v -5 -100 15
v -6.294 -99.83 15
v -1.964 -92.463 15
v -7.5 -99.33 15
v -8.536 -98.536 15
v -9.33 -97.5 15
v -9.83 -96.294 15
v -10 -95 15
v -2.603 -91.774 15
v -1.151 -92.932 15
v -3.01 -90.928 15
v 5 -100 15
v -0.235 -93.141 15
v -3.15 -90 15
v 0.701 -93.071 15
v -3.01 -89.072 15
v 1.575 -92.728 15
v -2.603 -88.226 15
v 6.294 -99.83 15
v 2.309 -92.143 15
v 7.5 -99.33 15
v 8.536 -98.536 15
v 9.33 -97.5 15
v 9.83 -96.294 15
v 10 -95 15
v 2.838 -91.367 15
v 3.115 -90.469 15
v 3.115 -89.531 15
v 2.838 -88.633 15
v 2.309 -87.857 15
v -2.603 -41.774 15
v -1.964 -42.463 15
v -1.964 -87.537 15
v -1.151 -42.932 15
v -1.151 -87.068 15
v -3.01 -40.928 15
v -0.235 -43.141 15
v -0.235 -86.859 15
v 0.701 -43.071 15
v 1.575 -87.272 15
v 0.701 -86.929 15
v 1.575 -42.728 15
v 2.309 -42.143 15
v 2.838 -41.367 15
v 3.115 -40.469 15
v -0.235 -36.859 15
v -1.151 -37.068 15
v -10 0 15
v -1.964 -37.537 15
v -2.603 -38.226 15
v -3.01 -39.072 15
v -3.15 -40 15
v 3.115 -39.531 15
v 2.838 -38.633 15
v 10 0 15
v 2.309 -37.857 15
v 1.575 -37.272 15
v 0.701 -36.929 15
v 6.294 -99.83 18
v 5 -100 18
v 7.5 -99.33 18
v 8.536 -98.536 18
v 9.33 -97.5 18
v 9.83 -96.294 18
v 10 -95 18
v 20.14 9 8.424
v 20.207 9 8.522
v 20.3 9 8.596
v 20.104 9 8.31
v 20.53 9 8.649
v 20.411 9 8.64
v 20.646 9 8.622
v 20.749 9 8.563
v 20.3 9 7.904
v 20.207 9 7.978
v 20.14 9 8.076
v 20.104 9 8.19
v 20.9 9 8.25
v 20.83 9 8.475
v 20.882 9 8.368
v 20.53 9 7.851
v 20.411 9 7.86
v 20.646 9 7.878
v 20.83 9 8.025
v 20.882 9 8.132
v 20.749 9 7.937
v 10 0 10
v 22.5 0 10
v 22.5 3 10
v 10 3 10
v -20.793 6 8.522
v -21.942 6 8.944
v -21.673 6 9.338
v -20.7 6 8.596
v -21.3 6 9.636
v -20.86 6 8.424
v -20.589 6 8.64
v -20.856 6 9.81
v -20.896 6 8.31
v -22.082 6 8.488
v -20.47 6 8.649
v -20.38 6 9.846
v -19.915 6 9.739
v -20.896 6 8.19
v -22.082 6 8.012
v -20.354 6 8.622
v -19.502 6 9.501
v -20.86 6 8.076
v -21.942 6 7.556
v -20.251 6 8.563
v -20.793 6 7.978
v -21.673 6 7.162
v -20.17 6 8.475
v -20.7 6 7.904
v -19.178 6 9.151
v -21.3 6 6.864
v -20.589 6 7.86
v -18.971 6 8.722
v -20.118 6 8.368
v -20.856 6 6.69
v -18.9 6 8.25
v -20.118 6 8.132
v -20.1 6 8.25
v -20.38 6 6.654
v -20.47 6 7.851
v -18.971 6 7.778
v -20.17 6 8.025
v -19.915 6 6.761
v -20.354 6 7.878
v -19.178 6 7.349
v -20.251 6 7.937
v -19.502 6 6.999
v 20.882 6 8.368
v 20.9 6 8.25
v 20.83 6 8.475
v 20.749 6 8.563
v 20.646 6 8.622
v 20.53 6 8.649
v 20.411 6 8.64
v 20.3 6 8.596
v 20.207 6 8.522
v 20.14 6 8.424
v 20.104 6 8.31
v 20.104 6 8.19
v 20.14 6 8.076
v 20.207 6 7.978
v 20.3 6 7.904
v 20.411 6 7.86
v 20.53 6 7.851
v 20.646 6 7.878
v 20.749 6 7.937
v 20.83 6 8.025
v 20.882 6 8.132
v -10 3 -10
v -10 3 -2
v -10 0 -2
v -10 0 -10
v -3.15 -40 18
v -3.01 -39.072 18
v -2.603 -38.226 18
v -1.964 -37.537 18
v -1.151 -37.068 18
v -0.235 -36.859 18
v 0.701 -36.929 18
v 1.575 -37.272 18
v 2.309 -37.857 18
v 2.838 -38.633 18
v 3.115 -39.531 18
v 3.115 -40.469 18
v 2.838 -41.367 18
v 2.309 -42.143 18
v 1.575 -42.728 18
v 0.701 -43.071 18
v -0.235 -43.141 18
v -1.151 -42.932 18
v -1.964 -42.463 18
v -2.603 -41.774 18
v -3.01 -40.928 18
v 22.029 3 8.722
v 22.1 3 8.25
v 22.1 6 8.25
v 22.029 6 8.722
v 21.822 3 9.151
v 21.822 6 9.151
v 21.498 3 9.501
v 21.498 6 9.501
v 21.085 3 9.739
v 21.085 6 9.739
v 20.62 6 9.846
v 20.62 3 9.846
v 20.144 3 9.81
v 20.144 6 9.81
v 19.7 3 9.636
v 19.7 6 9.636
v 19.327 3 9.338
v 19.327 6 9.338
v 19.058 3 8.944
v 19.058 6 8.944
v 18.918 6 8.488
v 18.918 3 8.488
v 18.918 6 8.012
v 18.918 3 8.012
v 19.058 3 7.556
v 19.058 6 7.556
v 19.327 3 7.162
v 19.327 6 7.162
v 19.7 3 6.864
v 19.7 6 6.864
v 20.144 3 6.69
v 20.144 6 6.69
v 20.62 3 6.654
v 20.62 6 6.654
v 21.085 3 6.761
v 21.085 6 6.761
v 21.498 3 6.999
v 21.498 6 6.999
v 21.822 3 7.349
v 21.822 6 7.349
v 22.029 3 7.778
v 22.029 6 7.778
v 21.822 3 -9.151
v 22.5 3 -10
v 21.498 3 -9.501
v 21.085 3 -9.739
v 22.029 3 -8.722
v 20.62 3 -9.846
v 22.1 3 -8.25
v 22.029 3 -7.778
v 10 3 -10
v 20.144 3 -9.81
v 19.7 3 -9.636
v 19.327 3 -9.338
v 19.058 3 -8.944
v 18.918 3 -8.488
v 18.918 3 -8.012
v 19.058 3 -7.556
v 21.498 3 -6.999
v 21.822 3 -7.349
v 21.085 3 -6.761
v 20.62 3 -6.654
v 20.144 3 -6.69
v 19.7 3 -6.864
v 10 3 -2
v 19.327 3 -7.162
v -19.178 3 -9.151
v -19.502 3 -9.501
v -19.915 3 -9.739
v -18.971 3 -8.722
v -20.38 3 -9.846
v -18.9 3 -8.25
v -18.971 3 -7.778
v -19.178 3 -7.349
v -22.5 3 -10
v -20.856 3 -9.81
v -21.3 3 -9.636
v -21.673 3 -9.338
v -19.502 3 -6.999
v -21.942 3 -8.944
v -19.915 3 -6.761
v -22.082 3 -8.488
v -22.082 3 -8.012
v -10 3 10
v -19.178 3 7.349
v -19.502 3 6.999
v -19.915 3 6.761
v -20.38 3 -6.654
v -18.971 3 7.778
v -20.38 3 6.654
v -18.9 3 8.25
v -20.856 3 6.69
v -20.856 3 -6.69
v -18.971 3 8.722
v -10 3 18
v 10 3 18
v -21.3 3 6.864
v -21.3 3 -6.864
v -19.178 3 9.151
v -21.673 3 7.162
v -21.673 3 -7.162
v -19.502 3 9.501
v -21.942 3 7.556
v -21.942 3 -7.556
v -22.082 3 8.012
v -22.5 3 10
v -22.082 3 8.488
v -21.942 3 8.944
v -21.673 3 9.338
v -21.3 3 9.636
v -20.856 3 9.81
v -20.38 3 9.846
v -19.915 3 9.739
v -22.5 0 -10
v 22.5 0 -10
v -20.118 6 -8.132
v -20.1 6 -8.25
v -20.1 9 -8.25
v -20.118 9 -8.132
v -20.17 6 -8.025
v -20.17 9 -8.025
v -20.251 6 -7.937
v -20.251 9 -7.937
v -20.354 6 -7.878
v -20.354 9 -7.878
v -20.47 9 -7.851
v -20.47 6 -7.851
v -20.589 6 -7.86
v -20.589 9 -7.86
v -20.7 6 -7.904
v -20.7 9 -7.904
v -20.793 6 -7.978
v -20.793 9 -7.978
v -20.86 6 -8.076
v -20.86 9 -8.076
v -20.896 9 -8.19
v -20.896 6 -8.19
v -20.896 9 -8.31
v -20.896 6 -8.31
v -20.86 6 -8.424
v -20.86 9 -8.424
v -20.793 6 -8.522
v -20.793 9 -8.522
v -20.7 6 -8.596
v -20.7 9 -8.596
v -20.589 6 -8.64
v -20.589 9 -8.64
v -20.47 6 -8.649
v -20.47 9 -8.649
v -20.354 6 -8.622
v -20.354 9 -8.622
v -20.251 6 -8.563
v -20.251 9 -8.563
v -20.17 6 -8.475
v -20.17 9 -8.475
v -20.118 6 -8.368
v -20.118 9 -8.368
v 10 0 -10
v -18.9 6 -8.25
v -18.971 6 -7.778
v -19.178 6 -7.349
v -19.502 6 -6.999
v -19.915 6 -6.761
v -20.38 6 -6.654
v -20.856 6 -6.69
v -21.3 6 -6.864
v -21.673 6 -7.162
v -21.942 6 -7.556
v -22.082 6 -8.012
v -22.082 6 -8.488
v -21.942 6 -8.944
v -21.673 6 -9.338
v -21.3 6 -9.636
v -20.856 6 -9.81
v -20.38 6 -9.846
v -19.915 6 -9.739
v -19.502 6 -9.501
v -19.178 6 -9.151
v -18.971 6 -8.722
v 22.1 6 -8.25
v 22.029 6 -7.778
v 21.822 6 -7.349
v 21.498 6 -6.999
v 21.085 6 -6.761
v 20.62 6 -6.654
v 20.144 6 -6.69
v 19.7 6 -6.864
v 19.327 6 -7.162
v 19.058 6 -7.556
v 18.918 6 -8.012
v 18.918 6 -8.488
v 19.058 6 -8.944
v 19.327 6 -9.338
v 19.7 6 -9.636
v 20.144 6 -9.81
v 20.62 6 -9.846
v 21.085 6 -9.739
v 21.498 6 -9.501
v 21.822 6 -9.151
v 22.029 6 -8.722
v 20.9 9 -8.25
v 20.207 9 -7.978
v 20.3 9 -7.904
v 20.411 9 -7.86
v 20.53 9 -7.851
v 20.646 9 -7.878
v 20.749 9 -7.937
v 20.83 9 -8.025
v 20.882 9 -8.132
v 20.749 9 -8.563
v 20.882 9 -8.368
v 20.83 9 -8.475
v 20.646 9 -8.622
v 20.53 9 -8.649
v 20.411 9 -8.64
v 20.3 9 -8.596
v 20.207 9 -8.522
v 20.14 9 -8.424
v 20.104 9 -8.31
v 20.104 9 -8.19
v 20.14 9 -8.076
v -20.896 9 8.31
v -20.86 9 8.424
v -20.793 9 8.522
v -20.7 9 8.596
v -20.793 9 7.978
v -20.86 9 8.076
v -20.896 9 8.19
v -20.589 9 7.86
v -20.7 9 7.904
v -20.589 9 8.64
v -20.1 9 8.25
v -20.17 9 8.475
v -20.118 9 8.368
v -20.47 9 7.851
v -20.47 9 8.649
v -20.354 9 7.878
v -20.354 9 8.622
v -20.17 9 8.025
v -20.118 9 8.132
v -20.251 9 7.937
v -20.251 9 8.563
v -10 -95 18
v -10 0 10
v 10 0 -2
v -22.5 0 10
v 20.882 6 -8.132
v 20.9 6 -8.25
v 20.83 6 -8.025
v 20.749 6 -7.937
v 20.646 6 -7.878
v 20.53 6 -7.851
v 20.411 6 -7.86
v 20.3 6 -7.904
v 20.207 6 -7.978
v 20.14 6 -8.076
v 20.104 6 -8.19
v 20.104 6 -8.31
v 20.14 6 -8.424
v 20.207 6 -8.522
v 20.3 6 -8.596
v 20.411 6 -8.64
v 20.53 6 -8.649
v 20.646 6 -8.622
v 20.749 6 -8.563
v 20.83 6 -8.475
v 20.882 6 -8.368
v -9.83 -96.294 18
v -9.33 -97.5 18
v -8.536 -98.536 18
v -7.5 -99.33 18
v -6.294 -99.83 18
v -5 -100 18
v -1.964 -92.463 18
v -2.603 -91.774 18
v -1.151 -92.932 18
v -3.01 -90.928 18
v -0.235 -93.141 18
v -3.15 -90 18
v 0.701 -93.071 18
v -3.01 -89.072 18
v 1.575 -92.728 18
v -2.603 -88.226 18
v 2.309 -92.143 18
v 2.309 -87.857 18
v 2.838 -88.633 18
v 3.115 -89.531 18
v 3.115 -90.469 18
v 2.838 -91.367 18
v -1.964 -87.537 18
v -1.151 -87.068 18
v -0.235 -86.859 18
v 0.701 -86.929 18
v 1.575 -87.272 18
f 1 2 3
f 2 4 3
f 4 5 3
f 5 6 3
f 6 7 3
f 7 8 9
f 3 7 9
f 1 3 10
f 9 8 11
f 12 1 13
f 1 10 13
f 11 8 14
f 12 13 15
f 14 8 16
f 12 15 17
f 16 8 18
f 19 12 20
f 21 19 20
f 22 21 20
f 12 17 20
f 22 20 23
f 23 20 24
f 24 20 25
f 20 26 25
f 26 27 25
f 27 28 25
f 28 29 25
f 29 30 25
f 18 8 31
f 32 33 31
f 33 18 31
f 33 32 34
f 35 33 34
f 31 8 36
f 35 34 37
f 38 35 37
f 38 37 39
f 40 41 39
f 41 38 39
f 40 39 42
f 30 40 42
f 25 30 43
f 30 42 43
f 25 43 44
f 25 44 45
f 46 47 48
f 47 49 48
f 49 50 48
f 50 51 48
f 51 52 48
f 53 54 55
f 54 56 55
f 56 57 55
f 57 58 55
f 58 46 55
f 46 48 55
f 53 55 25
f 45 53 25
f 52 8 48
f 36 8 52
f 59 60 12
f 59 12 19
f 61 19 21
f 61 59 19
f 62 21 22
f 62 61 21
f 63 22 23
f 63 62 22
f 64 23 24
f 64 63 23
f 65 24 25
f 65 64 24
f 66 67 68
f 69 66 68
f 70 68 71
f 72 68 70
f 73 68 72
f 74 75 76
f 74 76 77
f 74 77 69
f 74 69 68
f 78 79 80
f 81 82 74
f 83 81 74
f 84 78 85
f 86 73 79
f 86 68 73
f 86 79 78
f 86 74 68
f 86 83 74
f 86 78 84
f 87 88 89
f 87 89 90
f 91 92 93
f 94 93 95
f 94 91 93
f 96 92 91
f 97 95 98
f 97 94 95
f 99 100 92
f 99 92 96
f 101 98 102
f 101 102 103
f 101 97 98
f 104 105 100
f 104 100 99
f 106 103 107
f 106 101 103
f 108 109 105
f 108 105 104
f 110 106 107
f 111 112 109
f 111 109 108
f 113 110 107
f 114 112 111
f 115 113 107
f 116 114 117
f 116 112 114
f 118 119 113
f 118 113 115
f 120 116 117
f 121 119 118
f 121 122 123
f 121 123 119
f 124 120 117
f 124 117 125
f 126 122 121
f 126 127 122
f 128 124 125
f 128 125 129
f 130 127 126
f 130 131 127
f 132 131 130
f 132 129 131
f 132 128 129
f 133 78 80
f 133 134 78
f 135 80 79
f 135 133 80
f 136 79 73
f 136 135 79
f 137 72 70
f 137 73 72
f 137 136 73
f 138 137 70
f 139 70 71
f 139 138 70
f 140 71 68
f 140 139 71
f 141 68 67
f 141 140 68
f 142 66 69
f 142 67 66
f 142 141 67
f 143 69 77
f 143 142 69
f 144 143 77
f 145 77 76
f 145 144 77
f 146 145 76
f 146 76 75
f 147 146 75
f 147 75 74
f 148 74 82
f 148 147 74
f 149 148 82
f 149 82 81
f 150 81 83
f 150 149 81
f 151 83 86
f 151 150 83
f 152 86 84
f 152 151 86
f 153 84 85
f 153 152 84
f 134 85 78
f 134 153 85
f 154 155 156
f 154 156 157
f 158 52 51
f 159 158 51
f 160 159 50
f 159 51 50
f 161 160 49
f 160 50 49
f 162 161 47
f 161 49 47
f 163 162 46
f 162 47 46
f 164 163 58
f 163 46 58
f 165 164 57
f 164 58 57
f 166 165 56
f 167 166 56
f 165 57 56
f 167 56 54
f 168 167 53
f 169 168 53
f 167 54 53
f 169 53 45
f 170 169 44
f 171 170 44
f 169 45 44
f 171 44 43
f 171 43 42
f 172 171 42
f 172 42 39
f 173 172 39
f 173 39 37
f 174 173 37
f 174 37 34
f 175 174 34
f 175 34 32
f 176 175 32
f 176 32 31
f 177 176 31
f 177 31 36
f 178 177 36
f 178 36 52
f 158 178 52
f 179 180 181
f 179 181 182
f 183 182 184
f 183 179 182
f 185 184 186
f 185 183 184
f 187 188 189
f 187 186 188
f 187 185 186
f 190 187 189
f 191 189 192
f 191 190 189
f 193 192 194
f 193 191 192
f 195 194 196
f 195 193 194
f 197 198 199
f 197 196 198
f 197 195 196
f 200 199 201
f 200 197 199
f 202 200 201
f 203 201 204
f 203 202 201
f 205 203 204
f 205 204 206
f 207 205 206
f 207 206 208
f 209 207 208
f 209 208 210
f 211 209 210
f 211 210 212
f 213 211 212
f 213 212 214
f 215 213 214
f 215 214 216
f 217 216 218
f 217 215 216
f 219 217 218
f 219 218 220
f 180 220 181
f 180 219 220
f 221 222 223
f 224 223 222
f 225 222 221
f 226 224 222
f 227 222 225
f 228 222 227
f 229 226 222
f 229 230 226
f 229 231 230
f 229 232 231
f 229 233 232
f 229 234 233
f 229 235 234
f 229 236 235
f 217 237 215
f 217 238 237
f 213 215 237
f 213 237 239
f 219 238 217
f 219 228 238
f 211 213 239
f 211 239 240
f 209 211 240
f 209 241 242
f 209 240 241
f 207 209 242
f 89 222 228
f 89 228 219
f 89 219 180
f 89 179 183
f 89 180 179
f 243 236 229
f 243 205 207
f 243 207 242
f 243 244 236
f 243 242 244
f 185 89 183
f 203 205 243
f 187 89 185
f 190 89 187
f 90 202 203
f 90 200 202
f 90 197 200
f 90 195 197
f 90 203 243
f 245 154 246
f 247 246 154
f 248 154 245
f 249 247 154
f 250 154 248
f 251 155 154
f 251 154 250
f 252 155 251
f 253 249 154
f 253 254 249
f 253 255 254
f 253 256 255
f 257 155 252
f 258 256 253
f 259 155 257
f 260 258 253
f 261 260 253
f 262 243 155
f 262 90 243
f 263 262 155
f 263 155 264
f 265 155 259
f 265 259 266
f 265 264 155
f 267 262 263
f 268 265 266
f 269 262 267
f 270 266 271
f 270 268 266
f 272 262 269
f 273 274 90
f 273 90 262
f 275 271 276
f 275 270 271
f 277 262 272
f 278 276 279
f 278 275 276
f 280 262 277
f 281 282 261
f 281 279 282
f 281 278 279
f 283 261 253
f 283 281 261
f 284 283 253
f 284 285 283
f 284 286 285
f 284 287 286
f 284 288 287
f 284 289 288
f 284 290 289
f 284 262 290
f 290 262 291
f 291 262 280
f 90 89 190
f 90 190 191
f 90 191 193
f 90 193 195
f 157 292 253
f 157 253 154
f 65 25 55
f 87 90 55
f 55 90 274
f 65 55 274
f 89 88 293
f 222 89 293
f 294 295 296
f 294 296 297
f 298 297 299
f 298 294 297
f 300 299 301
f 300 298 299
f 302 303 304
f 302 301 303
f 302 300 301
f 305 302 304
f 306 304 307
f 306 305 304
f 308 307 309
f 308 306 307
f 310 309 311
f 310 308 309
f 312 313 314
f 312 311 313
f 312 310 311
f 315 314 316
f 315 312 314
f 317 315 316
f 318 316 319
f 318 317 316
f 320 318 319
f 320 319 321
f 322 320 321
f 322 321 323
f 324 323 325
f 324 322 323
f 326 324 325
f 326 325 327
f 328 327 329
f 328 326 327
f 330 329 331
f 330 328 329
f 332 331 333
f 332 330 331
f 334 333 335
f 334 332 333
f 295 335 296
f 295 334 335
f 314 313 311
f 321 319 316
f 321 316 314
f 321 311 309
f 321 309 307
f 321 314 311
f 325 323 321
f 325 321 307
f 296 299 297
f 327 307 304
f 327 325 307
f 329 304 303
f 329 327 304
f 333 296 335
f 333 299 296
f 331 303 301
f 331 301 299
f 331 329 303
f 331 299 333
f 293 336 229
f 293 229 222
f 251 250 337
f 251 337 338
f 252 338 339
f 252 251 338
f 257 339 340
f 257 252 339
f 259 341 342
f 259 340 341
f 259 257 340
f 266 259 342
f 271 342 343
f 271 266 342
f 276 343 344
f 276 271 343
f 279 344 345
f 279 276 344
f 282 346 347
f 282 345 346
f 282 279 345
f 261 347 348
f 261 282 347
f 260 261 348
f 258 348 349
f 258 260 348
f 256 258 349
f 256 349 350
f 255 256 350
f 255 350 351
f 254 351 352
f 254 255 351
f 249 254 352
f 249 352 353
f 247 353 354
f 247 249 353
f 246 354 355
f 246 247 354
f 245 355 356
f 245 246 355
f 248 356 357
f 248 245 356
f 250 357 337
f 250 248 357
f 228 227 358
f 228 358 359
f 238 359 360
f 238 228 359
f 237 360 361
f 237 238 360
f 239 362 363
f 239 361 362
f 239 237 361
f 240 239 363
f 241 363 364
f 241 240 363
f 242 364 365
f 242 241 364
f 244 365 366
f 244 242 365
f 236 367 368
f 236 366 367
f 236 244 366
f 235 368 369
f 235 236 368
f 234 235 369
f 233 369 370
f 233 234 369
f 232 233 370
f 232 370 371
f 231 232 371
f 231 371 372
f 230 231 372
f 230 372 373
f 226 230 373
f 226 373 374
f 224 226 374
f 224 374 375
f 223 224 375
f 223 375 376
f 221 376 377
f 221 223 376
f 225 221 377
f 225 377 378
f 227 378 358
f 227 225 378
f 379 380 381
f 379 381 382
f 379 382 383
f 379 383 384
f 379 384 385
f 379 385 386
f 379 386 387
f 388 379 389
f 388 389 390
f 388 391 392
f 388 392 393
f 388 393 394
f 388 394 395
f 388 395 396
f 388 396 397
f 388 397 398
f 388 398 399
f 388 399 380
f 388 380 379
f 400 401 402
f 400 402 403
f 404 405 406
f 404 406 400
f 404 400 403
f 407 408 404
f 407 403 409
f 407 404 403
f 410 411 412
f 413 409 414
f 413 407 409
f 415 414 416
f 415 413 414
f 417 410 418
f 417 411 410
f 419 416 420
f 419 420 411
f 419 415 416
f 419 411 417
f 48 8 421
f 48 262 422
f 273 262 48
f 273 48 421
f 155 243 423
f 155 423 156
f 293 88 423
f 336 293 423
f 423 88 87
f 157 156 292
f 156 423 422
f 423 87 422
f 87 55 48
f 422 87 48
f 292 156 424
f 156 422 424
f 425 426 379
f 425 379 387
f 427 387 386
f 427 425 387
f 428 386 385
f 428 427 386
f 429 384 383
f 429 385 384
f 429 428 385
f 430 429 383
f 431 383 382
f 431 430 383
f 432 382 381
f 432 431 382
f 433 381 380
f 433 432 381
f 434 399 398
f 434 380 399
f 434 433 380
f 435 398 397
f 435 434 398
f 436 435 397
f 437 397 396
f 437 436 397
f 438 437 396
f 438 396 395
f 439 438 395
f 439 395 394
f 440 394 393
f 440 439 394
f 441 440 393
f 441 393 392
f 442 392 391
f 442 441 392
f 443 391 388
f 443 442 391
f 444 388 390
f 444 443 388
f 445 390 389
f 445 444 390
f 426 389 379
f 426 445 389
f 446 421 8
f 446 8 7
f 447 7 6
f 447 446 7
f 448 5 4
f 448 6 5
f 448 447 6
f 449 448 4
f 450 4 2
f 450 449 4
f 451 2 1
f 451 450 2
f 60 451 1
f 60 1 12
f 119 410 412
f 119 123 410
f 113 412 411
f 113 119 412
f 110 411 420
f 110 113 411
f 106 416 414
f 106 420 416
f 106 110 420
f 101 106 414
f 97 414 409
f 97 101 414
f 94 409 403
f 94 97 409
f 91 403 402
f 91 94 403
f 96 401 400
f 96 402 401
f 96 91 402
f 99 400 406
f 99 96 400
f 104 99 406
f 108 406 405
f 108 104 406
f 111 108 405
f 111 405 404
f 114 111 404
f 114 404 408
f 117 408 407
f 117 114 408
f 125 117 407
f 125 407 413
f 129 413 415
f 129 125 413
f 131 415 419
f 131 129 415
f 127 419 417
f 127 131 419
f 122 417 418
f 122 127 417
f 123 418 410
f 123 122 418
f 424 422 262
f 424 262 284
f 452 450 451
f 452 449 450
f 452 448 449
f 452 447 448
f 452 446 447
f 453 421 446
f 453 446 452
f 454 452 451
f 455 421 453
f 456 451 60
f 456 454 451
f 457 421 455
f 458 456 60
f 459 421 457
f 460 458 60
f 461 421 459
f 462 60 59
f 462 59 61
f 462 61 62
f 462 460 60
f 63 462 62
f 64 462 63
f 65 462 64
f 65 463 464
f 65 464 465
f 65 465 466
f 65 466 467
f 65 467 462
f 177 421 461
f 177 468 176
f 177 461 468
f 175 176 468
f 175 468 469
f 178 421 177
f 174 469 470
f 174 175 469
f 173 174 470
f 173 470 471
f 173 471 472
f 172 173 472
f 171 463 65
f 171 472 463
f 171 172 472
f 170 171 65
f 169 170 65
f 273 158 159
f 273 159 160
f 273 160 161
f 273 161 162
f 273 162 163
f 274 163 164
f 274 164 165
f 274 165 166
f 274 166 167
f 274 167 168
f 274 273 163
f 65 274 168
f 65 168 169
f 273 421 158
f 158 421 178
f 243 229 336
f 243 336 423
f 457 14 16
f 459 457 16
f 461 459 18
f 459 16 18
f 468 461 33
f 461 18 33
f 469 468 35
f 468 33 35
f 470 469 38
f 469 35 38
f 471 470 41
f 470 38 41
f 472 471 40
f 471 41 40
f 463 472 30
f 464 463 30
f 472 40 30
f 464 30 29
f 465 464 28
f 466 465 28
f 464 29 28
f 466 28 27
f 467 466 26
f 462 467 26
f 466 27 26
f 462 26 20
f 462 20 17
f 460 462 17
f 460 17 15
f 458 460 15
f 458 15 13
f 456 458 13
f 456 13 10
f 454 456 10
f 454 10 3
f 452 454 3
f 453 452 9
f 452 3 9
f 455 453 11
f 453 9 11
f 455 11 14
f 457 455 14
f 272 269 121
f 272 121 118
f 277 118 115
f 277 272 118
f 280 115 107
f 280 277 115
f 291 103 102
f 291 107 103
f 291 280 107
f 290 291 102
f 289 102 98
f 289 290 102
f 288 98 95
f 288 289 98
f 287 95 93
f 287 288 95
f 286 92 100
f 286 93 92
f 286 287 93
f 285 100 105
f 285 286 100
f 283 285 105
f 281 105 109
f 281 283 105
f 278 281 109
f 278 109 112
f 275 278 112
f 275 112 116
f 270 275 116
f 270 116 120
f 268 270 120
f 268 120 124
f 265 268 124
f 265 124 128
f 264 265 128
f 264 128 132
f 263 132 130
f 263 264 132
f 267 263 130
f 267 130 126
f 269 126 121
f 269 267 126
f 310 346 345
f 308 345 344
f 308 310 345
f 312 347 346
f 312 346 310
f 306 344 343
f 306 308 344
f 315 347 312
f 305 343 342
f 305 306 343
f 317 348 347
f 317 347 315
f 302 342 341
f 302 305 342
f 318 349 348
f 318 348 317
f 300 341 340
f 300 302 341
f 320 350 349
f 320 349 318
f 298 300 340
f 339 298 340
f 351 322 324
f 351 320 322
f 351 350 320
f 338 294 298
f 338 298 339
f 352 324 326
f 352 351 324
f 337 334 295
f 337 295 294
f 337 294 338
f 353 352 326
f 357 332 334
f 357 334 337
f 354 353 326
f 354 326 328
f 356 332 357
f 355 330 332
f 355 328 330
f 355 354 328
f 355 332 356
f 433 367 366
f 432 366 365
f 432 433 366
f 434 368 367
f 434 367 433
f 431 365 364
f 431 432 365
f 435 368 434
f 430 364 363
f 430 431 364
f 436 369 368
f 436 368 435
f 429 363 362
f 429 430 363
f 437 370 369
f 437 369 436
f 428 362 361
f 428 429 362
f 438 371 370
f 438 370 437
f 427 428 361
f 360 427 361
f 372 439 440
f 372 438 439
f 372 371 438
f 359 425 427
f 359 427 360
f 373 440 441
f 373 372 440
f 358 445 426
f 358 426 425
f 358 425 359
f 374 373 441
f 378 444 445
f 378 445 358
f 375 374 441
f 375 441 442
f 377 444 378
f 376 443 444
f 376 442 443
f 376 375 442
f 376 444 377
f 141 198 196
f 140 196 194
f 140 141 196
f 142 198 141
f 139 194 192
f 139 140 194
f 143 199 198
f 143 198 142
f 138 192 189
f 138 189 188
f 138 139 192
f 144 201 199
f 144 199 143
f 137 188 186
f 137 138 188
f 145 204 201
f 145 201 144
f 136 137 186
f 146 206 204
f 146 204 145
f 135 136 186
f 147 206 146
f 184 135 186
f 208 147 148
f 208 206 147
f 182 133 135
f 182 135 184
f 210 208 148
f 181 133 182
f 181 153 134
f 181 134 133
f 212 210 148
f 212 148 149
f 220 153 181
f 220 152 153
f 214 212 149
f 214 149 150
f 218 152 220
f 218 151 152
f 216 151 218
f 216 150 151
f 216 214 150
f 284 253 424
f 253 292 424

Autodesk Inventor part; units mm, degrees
ref_plane "YZ Plane" through (0, 0, 0) normal (1, 0, 0) x (0, 1, 0)
ref_plane "XZ Plane" through (0, 0, 0) normal (0, 1, 0) x (-1, 0, 0)
ref_plane "XY Plane" through (0, 0, 0) normal (0, 0, 1) x (1, 0, 0)
sketch "스케치1" plane through (0, 0, 0) normal (0, 1, 0) x (-1, 0, 0)
  line L0 (20.5, 10) -> (-20.5, 10)
  line L1 (-22.5, 8) -> (-22.5, -8)
  line L2 (-20.5, -10) -> (20.5, -10)
  line L3 (22.5, -8) -> (22.5, 8)
  line L4 (22.5, 10) -> (-22.5, -10) construction
  line L5 (-22.5, 10) -> (22.5, -10) construction
  line L6 (20.5, 8.25) -> (-20.5, 8.25)
  line L7 (-20.5, 8.25) -> (-20.5, -8.25)
  line L8 (-20.5, -8.25) -> (20.5, -8.25)
  line L9 (20.5, -8.25) -> (20.5, 8.25)
  line L10 (20.5, 8.25) -> (-20.5, -8.25) construction
  line L11 (-20.5, 8.25) -> (20.5, -8.25) construction
  circle A0 centre (20.5, -8.25) radius 1.1
  circle A1 centre (-20.5, -8.25) radius 1.1
  circle A2 centre (-20.5, 8.25) radius 1.1
  circle A3 centre (20.5, 8.25) radius 1.1
  arc A4 (20.5, -10) -> (22.5, -8) centre (20.5, -8) ccw
  arc A5 (22.5, 8) -> (20.5, 10) centre (20.5, 8) ccw
  arc A6 (-20.5, 10) -> (-22.5, 8) centre (-20.5, 8) ccw
  arc A7 (-22.5, -8) -> (-20.5, -10) centre (-20.5, -8) ccw
  line L12 (-22.5, 10) -> (22.5, 10)
  line L13 (22.5, 10) -> (22.5, -10)
  line L14 (22.5, -10) -> (-22.5, -10)
  line L15 (-22.5, -10) -> (-22.5, 10)
  line L16 (-22.5, 10) -> (22.5, -10) construction
  line L17 (22.5, 10) -> (-22.5, -10) construction
  point P0 (0, 0)
  dimension "d0" = 45
  dimension "d1" = 20
  dimension "d2" = 41
  dimension "d3" = 16.5
  dimension "d4" = 2.2
  dimension "d5" = 2.2
  dimension "d6" = 2.2
  dimension "d7" = 2.2
  dimension "d8" = 2
extrude "돌출1" add sketch "스케치1" along normal blind 3 contours A5 L3 A4 L2 A7 L1 A6 L0 | L12 L13 A5 | A6 L15 L12 | L13 L14 A4 | A7 L14 L15 | L6 A3 L9 A0 L8 A1 L7 A2
sketch "스케치6" plane through (-22.5, 0, 10) normal (0, 0, 1) x (1, 0, 0)
  line L0 (45, 3) -> (0, 3) projected
  line L1 (12.5, 0) -> (32.5, 0)
  line L2 (32.5, 0) -> (32.5, 3)
  line L3 (32.5, 3) -> (12.5, 3)
  line L4 (12.5, 3) -> (12.5, 0)
  line L5 (12.5, 0) -> (32.5, 3) construction
  line L6 (32.5, 0) -> (12.5, 3) construction
  point P0 (22.5, 0)
  point P1 (22.5, 1.5)
  dimension "d23" = 20
extrude "돌출5" add sketch "스케치6" along normal blind 8
sketch "스케치7" plane through (0, 0, 0) normal (0, -1, 0) x (1, 0, 0)
  line L0 (-10, 18) -> (10, 18) projected
  line L1 (-10, 10) -> (-10, 18) projected
  line L2 (10, 18) -> (-10, 18)
  line L3 (-10, 18) -> (-10, 15)
  line L4 (-10, 15) -> (10, 15)
  line L5 (10, 15) -> (10, 18)
  point P0 (0, 0)
  dimension "d26" = 3
extrude "돌출6" add sketch "스케치7" along normal blind 100
sketch "스케치8" plane through (10, 0, 15) normal (0, 0, -1) x (-1, 0, 0)
  line L0 (20, -100) -> (0, -100) projected
  line L1 (10, -100) -> (10, -90)
  line L2 (10, -90) -> (10, -40)
  circle A0 centre (10, -40) radius 3.15
  circle A1 centre (10, -90) radius 3.15
  point P0 (10, 0)
  dimension "d29" = 10
  dimension "d30" = 50
  dimension "d31" = 6.3
  dimension "d32" = 6.3
extrude "돌출7" cut sketch "스케치8" against normal blind 100
sketch "스케치9" plane through (0, 3, 0) normal (0, 1, 0) x (1, 0, 0)
  circle A0 centre (-20.5, 8.25) radius 1.1 projected
  circle A1 centre (-20.5, 8.25) radius 1.1
  circle A2 centre (-20.5, 8.25) radius 1.6
  line L0 (22.5, 10) -> (-22.5, 10) projected
  line L1 (0, 10) -> (0, -18)
  line L2 (10, -18) -> (-10, -18) projected
  line L3 (-22.5, 10) -> (-22.5, -10) projected
  line L4 (-22.5, 0) -> (22.5, 0)
  line L5 (22.5, -10) -> (22.5, 10) projected
  circle A3 centre (20.5, 8.25) radius 1.1
  circle A4 centre (20.5, 8.25) radius 1.1
  circle A5 centre (20.5, 8.25) radius 1.6
  circle A6 centre (-20.5, -8.25) radius 1.1
  circle A7 centre (-20.5, -8.25) radius 1.1
  circle A8 centre (-20.5, -8.25) radius 1.6
  line L6 (22.5, -10) -> (-22.5, -10)
  circle A9 centre (20.5, -8.25) radius 1.1
  circle A10 centre (20.5, -8.25) radius 1.1
  circle A11 centre (20.5, -8.25) radius 1.6
  point P0 (0, 0)
  point P1 (0, -10)
  dimension "d35" = 0.5
extrude "돌출8" add sketch "스케치9" along normal blind 3 contours A2 | A5 | A8 | A11
sketch "스케치10" plane through (0, 3, 0) normal (0, 1, 0) x (1, 0, 0)
  line L0 (22.5, 10) -> (-22.5, 10) projected
  line L1 (0, 10) -> (-10, 10)
  line L2 (0, 10) -> (10, 10) construction
  line L3 (-10, 10) -> (10, 10)
  line L4 (10, 10) -> (10, 2)
  line L5 (10, 2) -> (-10, 2)
  line L6 (-10, 2) -> (-10, 10)
  point P0 (0, 0)
  dimension "d38" = 10
  dimension "d39" = 180
  dimension "d40" = 20
  dimension "d41" = 8
extrude "돌출9" cut sketch "스케치10" against normal blind 3
fillet "모깎기1" radius 5 2 edges at (-10, -100, 16.5) (10, -100, 16.5)
sketch "스케치11" plane through (-20.5, 6, -8.25) normal (0, 1, 0) x (1, 0, 0)
  circle A0 centre (0, 0) radius 1.1 projected
  circle A1 centre (0, 0) radius 1.1
  circle A2 centre (0, -16.5) radius 1.1 projected
  circle A3 centre (0, -16.5) radius 1.1
  circle A4 centre (41, 0) radius 1.1 projected
  circle A5 centre (41, 0) radius 1.1
  circle A6 centre (41, -16.5) radius 1.1 projected
  circle A7 centre (41, -16.5) radius 1.1
  point P0 (20.5, -8.25)
extrude "돌출10" add sketch "스케치11" against normal up to surface (6 mm away)
sketch "스케치12" plane through (20.5, 6, -8.25) normal (0, 1, 0) x (1, 0, 0)
  circle A0 centre (-41, 0) radius 1.6 projected
  circle A1 centre (-41, 0) radius 0.4
  circle A2 centre (-41, -16.5) radius 1.6 projected
  circle A3 centre (-41, -16.5) radius 0.4
  circle A4 centre (0, 0) radius 1.6 projected
  circle A5 centre (0, 0) radius 0.4
  circle A6 centre (0, -16.5) radius 1.6 projected
  circle A7 centre (0, -16.5) radius 0.4
  point P0 (-20.5, -8.25)
  dimension "d47" = 0.8
  dimension "d48" = 0.8
  dimension "d49" = 0.8
  dimension "d50" = 0.8
extrude "돌출11" add sketch "스케치12" along normal blind 3 contours A1 | A3 | A5 | A7
properties part number "sonic_sensor_holder"
